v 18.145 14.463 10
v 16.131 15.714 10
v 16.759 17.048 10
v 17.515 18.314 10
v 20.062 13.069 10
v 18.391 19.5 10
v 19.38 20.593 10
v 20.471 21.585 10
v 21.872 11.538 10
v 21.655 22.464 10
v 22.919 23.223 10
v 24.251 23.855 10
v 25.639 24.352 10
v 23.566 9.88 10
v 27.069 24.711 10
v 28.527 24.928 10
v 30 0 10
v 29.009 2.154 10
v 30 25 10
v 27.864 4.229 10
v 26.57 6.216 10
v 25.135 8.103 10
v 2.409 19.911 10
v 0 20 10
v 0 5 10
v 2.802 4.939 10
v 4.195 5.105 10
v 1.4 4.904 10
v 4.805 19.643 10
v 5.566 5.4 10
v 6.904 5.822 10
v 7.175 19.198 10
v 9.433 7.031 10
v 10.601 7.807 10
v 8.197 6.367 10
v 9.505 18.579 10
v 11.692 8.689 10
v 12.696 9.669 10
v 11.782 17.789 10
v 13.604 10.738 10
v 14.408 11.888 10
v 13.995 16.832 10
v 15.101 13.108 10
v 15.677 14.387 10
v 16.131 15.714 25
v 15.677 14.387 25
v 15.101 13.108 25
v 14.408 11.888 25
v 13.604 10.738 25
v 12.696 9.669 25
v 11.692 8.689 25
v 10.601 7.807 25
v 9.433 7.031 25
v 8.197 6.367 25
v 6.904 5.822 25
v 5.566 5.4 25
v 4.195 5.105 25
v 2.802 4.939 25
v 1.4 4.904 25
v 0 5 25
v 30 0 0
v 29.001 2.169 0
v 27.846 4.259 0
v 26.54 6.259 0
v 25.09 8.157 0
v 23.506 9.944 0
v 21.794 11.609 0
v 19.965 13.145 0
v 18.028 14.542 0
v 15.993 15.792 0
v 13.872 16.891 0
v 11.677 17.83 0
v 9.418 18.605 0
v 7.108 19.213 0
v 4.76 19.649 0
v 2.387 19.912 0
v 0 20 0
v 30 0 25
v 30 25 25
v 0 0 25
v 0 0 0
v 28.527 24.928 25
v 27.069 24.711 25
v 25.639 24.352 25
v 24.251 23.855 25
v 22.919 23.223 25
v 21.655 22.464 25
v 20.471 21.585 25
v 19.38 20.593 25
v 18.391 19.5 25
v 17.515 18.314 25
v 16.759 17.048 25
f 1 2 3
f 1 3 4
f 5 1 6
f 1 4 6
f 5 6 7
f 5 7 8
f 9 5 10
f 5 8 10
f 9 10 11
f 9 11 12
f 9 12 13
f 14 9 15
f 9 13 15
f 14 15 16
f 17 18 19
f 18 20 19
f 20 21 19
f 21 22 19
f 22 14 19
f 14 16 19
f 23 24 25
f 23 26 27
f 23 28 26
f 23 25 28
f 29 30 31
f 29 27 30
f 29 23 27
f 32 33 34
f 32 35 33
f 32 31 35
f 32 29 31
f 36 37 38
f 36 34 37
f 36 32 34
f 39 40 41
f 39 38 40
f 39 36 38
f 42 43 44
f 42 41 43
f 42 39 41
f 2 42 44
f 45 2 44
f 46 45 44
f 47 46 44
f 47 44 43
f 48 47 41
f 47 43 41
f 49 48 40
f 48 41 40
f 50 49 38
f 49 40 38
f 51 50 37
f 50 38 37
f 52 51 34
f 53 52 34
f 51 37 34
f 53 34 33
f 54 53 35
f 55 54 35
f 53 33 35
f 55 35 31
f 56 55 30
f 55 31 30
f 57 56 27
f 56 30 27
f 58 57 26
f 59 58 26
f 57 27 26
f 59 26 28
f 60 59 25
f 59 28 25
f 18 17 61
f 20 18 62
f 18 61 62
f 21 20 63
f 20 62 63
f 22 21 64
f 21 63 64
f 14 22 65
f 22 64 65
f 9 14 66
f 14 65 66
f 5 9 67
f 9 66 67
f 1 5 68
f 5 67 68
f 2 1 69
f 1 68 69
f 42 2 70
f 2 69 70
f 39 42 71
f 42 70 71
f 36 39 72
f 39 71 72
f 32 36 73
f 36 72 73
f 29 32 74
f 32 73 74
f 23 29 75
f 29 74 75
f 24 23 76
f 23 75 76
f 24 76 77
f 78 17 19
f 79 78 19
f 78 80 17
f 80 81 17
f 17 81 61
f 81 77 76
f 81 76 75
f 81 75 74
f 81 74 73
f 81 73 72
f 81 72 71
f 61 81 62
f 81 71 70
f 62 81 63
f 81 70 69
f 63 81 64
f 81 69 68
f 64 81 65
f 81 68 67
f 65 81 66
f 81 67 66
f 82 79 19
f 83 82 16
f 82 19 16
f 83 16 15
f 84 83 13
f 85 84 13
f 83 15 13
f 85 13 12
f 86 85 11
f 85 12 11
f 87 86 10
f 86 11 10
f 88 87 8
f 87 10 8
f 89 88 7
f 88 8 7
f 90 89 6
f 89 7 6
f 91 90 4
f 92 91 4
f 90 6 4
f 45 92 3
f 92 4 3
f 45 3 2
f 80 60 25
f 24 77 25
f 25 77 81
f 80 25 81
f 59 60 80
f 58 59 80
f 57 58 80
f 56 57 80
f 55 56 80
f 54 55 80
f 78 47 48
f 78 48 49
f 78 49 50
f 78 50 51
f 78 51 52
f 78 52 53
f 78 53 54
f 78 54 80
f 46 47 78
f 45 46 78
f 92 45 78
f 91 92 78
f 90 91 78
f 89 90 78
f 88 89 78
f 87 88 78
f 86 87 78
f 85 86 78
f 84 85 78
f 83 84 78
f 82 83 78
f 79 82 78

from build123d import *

# Parameters (mm, degrees)
BOSS_EXTRUDE1_DEPTH = 10
BOSS_EXTRUDE5_DEPTH = 15


with BuildPart() as part:
    # Sketch1 → Boss-Extrude1 (new body)
    with BuildSketch(Plane.XY):
        with BuildLine():
            Line((0, 20), (0, 0))
            Line((0, 0), (30, 0))
            ThreePointArc((30, 0), (18.027756377, 14.541634566), (0, 20))
        make_face()
    extrude(amount=BOSS_EXTRUDE1_DEPTH)

    # Sketch2 → Boss-Extrude5 (add)
    with BuildSketch(Plane.XY.offset(10)):
        with BuildLine():
            Line((0, 5), (0, 0))
            Line((0, 0), (30, 0))
            Line((30, 0), (30, 25))
            ThreePointArc((30, 25), (21.654721001, 22.464201476), (16.131034824, 15.71417579))
            ThreePointArc((16.131034824, 15.71417579), (10.026103583, 7.405271123), (0, 5))
        make_face()
    extrude(amount=BOSS_EXTRUDE5_DEPTH)


solid = part.part
